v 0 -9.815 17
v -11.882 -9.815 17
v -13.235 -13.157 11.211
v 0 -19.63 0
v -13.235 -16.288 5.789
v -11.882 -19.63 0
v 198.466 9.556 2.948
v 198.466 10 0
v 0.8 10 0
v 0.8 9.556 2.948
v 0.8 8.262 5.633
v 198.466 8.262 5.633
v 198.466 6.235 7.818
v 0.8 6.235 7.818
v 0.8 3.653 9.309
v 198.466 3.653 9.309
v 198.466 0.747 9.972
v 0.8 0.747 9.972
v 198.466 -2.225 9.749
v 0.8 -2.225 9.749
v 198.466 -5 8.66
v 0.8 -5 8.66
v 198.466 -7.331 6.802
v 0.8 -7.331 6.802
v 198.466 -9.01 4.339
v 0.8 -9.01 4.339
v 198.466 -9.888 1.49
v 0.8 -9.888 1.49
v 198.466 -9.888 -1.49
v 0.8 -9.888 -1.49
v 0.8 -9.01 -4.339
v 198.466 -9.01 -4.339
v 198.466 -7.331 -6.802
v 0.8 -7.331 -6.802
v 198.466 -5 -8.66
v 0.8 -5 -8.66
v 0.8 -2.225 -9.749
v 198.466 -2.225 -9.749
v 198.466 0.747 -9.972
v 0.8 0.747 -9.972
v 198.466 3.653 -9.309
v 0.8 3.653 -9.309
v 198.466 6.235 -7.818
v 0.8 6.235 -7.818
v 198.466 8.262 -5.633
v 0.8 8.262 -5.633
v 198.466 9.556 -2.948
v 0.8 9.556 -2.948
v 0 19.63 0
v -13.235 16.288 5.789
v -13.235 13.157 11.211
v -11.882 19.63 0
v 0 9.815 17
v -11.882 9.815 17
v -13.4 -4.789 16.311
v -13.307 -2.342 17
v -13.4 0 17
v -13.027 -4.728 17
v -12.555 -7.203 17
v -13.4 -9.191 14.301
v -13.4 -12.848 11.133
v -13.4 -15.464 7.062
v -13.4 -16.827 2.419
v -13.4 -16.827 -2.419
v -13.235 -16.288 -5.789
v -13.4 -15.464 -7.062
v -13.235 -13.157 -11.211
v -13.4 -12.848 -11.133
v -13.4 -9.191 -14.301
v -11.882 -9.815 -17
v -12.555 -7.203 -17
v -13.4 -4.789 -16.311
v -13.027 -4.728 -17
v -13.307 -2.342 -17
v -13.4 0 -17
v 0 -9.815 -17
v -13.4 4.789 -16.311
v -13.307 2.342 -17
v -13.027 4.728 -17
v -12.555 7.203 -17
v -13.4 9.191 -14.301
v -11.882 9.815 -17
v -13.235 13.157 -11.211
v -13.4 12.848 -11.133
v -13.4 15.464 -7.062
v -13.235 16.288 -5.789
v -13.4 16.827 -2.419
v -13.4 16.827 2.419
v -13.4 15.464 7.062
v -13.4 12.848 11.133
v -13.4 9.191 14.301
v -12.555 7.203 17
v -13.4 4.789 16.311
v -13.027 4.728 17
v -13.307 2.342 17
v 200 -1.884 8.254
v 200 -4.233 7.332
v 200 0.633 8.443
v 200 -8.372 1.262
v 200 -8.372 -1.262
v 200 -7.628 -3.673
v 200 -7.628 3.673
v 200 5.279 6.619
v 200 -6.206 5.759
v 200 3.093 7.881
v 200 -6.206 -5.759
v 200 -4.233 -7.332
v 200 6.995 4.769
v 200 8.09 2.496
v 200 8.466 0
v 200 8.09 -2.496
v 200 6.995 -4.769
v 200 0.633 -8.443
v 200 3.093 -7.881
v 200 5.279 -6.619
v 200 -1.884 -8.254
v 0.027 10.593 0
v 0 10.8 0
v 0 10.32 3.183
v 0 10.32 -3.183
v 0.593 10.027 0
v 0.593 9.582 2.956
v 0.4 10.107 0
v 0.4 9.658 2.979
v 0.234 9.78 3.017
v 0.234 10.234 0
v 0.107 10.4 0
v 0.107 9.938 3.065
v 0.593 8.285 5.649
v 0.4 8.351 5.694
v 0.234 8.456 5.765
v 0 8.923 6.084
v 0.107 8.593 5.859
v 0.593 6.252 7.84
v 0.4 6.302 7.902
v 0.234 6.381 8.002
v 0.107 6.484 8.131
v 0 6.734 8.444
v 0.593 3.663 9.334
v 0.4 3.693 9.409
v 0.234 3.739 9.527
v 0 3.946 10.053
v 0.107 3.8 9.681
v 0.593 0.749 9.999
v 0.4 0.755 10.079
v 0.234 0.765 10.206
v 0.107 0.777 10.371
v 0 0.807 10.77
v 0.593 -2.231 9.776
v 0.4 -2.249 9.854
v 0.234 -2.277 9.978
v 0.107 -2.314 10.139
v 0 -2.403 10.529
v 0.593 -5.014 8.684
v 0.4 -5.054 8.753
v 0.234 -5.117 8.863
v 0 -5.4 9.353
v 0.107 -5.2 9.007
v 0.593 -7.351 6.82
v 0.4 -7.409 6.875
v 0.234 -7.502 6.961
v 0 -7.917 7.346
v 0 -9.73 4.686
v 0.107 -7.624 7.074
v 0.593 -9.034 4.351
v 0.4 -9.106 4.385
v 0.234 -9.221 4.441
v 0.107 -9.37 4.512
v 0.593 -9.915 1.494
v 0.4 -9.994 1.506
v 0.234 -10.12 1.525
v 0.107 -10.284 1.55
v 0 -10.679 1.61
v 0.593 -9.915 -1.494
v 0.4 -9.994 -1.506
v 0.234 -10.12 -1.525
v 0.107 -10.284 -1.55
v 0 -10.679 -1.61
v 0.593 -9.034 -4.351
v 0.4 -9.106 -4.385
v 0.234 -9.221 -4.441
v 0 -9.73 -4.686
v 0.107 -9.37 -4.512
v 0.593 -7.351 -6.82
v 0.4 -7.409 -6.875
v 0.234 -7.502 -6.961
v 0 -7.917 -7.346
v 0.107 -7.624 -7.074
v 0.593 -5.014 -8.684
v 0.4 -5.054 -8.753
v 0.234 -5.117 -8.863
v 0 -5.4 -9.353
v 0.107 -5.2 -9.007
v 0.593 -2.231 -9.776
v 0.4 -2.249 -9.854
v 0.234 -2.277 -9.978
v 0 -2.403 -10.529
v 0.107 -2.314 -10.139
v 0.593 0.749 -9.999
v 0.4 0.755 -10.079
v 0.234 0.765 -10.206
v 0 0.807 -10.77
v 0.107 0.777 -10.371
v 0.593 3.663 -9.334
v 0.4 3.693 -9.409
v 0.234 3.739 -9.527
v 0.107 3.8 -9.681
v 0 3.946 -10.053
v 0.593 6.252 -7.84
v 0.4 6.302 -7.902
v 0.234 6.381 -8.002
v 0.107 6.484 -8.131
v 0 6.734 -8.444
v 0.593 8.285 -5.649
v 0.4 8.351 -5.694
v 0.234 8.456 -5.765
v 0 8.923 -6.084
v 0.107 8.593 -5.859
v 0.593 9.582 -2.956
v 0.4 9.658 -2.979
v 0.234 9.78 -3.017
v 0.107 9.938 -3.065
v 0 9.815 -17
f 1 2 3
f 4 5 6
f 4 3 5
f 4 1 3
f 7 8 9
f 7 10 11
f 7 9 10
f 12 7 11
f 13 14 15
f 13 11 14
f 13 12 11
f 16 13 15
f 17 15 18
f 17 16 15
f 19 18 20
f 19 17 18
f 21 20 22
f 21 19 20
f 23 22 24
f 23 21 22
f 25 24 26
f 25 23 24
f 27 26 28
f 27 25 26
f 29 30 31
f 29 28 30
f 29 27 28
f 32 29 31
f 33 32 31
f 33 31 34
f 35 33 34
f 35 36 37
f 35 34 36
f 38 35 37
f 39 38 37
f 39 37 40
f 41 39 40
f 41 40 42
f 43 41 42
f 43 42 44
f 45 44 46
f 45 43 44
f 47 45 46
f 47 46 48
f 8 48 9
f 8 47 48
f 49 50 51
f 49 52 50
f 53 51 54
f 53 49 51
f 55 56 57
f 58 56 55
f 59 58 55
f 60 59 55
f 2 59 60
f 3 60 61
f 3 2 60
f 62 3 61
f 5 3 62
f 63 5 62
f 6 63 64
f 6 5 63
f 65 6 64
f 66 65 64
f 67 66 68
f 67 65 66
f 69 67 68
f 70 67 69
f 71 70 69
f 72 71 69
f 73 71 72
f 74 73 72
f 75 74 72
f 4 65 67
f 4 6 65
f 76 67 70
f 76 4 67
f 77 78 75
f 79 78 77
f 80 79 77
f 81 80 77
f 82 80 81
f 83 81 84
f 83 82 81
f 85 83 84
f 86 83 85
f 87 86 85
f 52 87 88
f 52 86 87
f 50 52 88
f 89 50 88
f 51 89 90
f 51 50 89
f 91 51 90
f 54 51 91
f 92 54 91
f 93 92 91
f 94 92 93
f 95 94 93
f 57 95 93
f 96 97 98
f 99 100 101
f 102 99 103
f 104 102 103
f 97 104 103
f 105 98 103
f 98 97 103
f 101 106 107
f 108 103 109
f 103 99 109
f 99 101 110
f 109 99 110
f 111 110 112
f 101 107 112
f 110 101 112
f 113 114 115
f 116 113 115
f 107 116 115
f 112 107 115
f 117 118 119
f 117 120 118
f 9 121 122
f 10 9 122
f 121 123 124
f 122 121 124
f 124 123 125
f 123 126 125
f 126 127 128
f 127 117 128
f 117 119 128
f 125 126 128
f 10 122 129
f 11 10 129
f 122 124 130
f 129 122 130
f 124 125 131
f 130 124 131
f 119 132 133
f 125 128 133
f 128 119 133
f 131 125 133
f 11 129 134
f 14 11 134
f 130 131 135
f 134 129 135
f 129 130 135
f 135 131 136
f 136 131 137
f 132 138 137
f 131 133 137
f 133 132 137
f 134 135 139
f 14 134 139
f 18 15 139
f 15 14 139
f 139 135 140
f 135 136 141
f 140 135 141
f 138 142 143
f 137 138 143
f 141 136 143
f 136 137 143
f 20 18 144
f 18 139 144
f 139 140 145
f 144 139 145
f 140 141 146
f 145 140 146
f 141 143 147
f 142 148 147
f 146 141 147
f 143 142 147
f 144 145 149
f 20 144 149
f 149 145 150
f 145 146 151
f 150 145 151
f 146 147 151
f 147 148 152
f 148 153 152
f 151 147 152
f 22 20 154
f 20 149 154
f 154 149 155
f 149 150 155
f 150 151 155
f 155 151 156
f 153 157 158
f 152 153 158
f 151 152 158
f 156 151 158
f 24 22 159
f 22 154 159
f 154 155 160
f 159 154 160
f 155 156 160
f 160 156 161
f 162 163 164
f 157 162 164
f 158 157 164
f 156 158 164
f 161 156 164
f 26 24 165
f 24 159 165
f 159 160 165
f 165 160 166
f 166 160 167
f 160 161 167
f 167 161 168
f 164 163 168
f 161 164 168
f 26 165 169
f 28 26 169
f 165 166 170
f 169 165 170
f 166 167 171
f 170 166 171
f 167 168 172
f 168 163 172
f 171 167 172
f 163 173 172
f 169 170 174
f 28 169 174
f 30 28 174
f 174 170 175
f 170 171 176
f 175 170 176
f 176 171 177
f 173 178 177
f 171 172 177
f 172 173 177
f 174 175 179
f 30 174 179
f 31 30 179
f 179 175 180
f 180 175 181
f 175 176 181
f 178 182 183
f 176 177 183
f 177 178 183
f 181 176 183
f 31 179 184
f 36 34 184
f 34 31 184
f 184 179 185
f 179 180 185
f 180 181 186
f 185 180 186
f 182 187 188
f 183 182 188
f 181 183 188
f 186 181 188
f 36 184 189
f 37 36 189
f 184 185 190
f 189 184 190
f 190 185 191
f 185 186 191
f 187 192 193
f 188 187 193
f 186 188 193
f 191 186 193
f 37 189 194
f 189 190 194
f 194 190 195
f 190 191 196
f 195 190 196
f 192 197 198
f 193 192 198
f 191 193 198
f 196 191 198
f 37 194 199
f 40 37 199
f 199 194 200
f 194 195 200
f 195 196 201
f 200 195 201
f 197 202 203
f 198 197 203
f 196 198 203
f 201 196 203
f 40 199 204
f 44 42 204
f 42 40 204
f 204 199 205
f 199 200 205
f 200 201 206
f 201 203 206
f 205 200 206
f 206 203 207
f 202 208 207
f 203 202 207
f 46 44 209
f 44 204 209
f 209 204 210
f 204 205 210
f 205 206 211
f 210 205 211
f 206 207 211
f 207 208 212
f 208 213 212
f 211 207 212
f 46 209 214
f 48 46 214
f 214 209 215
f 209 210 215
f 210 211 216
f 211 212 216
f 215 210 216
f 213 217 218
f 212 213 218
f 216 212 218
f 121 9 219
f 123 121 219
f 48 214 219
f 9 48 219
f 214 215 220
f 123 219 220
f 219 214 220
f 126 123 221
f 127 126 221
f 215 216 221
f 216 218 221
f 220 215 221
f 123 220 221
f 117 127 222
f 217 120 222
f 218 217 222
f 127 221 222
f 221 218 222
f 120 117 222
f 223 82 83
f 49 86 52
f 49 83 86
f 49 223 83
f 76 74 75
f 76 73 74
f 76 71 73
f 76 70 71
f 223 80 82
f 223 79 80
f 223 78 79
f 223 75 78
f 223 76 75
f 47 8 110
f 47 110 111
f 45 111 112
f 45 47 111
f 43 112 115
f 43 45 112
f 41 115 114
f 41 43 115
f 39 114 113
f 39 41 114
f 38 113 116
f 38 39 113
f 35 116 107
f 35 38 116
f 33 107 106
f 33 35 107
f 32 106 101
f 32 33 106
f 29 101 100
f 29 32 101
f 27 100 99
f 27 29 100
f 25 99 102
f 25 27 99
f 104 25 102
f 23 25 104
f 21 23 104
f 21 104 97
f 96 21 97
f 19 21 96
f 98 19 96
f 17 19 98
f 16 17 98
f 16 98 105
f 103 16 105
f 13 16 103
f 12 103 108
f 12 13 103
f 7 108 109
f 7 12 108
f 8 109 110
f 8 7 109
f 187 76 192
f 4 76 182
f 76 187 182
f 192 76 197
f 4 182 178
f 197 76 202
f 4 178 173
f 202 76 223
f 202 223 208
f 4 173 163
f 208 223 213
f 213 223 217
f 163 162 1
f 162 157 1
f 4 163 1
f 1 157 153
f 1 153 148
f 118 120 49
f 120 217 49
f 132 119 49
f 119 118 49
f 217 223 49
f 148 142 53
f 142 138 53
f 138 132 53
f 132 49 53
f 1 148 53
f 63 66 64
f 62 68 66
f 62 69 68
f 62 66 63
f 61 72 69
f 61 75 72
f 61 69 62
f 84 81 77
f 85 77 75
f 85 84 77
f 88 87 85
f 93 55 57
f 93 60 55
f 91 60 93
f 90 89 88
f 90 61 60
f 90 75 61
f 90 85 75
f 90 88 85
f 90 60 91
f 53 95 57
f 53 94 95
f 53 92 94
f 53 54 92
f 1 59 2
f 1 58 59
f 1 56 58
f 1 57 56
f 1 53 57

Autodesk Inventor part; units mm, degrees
ref_plane "YZ Plane" through (0, 0, 0) normal (1, 0, 0) x (0, 1, 0)
ref_plane "XZ Plane" through (0, 0, 0) normal (0, 1, 0) x (-1, 0, 0)
sketch "Sketch1" plane through (0, 0, 0) normal (0, 0, 1) x (1, 0, 0)
  line L0 (0, 10) -> (200, 10)
  line L1 (200, 10) -> (200, 0)
  line L2 (200, 0) -> (0, 0)
  line L3 (-40, 0) -> (240, 0) projected
  line L4 (0, -2) -> (0, 12) projected
  line L5 (0, 10) -> (0, 0)
  dimension "d2" = 20
  dimension "d59" = 200
revolve "Body" add sketch "Sketch1" angle 360 about axis through (200, 0, 0) along (-1, 0, 0)
sketch "Sketch2" plane through (0, 0, 0) normal (-1, 0, 0) x (0, 0, 1)
  line L0 (0, 19.6299) -> (17, 9.815)
  line L1 (17, 9.815) -> (17, -9.815)
  line L2 (17, -9.815) -> (0, -19.6299)
  line L3 (0, -19.6299) -> (-17, -9.815)
  line L4 (-17, -9.815) -> (-17, 9.815)
  line L5 (-17, 9.815) -> (0, 19.6299)
  line L6 (-23.8, 0) -> (23.8, 0) projected
  line L7 (0, 27.4819) -> (0, -27.4819) projected
  point P0 (0, 0)
  point P1 (0, 0)
  dimension "d11" = 34
extrude "Head" add sketch "Sketch2" along normal blind 13.4
sketch "Sketch4" plane through (0, 0, 0) normal (0, 0, 1) x (1, 0, 0)
  line L0 (-11.437, 20.4) -> (-13.4, 17)
  line L1 (-1.1, 0) -> (-0.234, 0)
  line L2 (-16.0332, 0) -> (2.3992, 0) projected
  line L3 (-13.4, 20.4) -> (-11.437, 20.4)
  line L4 (-13.4, 17) -> (-13.4, 20.4)
  line L5 (0, 24.48) -> (0, -4.08) projected
  dimension "d65" = 34
  dimension "d67" = 30
  dimension "d68" = 40.8
  dimension "d69" = 13.4
revolve "Chamfer1" cut sketch "Sketch4" angle 360 about axis through (-1.1, 0, 0) along (1, 0, 0)
thread "Thread" size "M20x2.5" class "6g" standard "ISO Metric profile" length 52
chamfer "Chamfer2" distance 1.5336 distance2 1.5337 1 edges at (200, -10, 0) measured on face at (200, 1.182, 2.3698)
fillet "Fillet" radius 0.8 1 edges at (0, -10, 0)
ref_plane "Work Plane1" through (1.525, 0, 0) normal (0, 0, 1) x (1, 0, 0)
equation "\"d2\" = GD"
equation "\"d59\" = NLG"
equation "\"d11\" = SW"
equation "\"d3\" = KOH"
equation "\"d15\" = GEL"
equation "\"d6\" = -0.5 * SPD + 0.5 * GD"
equation "\"d71\" = RR1"
equation "\"d65\" = SW"
equation "\"d67\" = ANG1"
equation "\"d68\" = 1.2 * SW"
equation "\"d69\" = KOH"
equation "\"NLG\" = 200"
equation "\"GD\" = NND"
equation "\"KOH\" = 13.4"
equation "\"GEL\" = 52"
equation "\"SW\" = 34"
equation "\"SW0\" = SW"
equation "\"SPD\" = NND - 1.2269 * PTC"
equation "\"SD\" = 0"
equation "\"ANG1\" = 30deg"
equation "\"GAL\" = 0.61345 * PTC"
equation "\"GUL\" = 0.61345 * PTC"
equation "\"RR\" = 0.1"
equation "\"RR1\" = 0.8"
equation "\"GD1\" = THREADDIA - 1.2269 * PTC"
equation "\"TOA\" = 30deg"
equation "\"PTC\" = 2.5"
equation "\"KOH1\" = 8.8"
equation "\"E0\" = 1.155 * SW"
equation "\"NND\" = 20"
equation "\"THREADDIA\" = 20"
properties part number "ANSI B18.2.3.6M - M20 x 2.5 x 200" material "Steel, Mild"
